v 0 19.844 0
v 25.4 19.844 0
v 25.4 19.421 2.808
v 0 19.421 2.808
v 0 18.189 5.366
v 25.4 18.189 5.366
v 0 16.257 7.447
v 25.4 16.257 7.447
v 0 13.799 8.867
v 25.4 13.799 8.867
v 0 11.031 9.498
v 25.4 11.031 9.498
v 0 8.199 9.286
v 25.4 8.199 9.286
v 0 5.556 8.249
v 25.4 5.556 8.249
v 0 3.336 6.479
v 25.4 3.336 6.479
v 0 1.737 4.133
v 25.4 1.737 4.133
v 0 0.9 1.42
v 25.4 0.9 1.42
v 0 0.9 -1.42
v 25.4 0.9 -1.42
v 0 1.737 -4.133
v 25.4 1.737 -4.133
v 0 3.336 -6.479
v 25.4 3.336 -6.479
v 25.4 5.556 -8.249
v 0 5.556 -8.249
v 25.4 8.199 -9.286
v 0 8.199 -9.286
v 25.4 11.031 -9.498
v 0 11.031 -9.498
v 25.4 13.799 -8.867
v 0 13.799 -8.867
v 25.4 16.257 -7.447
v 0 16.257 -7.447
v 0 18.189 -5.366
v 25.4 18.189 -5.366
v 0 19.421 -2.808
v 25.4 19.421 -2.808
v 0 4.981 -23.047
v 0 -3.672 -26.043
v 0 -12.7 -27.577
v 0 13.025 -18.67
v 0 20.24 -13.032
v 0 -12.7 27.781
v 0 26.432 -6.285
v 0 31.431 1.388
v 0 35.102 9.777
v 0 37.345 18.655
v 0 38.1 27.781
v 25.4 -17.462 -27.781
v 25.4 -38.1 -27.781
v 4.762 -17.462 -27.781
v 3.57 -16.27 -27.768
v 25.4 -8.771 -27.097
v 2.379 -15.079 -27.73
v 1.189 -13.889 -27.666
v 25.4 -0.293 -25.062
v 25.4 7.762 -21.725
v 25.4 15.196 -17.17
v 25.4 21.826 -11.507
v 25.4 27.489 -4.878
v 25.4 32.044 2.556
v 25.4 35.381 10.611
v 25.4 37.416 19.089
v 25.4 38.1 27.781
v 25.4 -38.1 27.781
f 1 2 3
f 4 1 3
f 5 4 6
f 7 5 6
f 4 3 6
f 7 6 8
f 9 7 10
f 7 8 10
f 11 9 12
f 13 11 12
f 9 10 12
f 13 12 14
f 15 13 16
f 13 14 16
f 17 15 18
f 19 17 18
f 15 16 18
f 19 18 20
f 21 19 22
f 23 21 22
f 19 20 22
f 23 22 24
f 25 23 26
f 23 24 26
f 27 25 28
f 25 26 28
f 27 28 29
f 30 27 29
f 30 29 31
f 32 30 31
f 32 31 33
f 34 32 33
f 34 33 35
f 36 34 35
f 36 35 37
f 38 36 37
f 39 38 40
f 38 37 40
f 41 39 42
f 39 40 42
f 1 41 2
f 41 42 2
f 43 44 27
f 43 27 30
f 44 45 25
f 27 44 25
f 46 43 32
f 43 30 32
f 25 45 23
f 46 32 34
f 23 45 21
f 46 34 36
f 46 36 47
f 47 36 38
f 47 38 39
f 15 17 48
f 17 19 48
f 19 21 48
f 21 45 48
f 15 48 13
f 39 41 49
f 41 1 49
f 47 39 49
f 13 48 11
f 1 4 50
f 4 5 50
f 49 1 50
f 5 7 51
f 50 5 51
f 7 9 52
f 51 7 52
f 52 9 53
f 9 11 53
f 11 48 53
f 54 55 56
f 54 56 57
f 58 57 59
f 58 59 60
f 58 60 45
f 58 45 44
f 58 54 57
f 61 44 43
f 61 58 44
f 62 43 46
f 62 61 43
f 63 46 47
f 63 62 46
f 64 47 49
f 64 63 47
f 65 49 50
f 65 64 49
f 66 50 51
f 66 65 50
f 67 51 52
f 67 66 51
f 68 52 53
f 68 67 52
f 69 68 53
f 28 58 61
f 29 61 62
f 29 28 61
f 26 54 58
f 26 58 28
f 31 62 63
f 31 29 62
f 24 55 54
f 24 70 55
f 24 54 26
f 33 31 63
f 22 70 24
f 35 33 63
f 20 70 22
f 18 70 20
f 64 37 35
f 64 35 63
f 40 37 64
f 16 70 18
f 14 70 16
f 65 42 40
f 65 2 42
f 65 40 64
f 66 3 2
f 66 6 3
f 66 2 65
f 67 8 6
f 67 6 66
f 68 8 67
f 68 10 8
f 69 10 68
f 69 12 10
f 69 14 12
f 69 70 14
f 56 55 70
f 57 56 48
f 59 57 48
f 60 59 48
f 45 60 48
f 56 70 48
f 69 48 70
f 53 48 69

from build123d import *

# Parameters (mm, degrees)
F0_W     = 76.2
F0_H     = 55.5625
F1_DEPTH = 25.4
F2_R     = 55.56249
F3_R     = 9.525
F4_DEPTH = 25.4
F6_DEPTH = 55.5635


# Not quite as in the source:
# - a fillet or chamfer is up to 0.001 mm smaller than in the source, because OpenCascade refuses the exact size


with BuildPart() as f1:
    # F0 (on Right) → F1 (new body)
    with BuildSketch(Plane.YZ):
        Rectangle(F0_W, F0_H)
    extrude(amount=F1_DEPTH)

    # F2 (radius 55.5625 in the source; OpenCascade refuses exactly that, so slightly less here)
    f2_edges = [f1.edges().sort_by_distance(p)[0] for p in [
        (12.7, 38.1, -27.78125),
    ]]
    fillet(f2_edges, radius=F2_R)

    # F3 (on face) → F4 (cut)
    with BuildSketch(Plane.YZ.offset(25.4)):
        with Locations((10.31875, 0)):
            Circle(F3_R)
    extrude(amount=-F4_DEPTH, mode=Mode.SUBTRACT)

    # F5 (on face) → F6 (cut, through all)
    with BuildSketch(Plane.XY.offset(27.78125)):
        Polygon((0, -38.1), (25.4, -38.1), (0, -12.7), align=None)
    extrude(amount=-F6_DEPTH, mode=Mode.SUBTRACT)


solid = f1.part
